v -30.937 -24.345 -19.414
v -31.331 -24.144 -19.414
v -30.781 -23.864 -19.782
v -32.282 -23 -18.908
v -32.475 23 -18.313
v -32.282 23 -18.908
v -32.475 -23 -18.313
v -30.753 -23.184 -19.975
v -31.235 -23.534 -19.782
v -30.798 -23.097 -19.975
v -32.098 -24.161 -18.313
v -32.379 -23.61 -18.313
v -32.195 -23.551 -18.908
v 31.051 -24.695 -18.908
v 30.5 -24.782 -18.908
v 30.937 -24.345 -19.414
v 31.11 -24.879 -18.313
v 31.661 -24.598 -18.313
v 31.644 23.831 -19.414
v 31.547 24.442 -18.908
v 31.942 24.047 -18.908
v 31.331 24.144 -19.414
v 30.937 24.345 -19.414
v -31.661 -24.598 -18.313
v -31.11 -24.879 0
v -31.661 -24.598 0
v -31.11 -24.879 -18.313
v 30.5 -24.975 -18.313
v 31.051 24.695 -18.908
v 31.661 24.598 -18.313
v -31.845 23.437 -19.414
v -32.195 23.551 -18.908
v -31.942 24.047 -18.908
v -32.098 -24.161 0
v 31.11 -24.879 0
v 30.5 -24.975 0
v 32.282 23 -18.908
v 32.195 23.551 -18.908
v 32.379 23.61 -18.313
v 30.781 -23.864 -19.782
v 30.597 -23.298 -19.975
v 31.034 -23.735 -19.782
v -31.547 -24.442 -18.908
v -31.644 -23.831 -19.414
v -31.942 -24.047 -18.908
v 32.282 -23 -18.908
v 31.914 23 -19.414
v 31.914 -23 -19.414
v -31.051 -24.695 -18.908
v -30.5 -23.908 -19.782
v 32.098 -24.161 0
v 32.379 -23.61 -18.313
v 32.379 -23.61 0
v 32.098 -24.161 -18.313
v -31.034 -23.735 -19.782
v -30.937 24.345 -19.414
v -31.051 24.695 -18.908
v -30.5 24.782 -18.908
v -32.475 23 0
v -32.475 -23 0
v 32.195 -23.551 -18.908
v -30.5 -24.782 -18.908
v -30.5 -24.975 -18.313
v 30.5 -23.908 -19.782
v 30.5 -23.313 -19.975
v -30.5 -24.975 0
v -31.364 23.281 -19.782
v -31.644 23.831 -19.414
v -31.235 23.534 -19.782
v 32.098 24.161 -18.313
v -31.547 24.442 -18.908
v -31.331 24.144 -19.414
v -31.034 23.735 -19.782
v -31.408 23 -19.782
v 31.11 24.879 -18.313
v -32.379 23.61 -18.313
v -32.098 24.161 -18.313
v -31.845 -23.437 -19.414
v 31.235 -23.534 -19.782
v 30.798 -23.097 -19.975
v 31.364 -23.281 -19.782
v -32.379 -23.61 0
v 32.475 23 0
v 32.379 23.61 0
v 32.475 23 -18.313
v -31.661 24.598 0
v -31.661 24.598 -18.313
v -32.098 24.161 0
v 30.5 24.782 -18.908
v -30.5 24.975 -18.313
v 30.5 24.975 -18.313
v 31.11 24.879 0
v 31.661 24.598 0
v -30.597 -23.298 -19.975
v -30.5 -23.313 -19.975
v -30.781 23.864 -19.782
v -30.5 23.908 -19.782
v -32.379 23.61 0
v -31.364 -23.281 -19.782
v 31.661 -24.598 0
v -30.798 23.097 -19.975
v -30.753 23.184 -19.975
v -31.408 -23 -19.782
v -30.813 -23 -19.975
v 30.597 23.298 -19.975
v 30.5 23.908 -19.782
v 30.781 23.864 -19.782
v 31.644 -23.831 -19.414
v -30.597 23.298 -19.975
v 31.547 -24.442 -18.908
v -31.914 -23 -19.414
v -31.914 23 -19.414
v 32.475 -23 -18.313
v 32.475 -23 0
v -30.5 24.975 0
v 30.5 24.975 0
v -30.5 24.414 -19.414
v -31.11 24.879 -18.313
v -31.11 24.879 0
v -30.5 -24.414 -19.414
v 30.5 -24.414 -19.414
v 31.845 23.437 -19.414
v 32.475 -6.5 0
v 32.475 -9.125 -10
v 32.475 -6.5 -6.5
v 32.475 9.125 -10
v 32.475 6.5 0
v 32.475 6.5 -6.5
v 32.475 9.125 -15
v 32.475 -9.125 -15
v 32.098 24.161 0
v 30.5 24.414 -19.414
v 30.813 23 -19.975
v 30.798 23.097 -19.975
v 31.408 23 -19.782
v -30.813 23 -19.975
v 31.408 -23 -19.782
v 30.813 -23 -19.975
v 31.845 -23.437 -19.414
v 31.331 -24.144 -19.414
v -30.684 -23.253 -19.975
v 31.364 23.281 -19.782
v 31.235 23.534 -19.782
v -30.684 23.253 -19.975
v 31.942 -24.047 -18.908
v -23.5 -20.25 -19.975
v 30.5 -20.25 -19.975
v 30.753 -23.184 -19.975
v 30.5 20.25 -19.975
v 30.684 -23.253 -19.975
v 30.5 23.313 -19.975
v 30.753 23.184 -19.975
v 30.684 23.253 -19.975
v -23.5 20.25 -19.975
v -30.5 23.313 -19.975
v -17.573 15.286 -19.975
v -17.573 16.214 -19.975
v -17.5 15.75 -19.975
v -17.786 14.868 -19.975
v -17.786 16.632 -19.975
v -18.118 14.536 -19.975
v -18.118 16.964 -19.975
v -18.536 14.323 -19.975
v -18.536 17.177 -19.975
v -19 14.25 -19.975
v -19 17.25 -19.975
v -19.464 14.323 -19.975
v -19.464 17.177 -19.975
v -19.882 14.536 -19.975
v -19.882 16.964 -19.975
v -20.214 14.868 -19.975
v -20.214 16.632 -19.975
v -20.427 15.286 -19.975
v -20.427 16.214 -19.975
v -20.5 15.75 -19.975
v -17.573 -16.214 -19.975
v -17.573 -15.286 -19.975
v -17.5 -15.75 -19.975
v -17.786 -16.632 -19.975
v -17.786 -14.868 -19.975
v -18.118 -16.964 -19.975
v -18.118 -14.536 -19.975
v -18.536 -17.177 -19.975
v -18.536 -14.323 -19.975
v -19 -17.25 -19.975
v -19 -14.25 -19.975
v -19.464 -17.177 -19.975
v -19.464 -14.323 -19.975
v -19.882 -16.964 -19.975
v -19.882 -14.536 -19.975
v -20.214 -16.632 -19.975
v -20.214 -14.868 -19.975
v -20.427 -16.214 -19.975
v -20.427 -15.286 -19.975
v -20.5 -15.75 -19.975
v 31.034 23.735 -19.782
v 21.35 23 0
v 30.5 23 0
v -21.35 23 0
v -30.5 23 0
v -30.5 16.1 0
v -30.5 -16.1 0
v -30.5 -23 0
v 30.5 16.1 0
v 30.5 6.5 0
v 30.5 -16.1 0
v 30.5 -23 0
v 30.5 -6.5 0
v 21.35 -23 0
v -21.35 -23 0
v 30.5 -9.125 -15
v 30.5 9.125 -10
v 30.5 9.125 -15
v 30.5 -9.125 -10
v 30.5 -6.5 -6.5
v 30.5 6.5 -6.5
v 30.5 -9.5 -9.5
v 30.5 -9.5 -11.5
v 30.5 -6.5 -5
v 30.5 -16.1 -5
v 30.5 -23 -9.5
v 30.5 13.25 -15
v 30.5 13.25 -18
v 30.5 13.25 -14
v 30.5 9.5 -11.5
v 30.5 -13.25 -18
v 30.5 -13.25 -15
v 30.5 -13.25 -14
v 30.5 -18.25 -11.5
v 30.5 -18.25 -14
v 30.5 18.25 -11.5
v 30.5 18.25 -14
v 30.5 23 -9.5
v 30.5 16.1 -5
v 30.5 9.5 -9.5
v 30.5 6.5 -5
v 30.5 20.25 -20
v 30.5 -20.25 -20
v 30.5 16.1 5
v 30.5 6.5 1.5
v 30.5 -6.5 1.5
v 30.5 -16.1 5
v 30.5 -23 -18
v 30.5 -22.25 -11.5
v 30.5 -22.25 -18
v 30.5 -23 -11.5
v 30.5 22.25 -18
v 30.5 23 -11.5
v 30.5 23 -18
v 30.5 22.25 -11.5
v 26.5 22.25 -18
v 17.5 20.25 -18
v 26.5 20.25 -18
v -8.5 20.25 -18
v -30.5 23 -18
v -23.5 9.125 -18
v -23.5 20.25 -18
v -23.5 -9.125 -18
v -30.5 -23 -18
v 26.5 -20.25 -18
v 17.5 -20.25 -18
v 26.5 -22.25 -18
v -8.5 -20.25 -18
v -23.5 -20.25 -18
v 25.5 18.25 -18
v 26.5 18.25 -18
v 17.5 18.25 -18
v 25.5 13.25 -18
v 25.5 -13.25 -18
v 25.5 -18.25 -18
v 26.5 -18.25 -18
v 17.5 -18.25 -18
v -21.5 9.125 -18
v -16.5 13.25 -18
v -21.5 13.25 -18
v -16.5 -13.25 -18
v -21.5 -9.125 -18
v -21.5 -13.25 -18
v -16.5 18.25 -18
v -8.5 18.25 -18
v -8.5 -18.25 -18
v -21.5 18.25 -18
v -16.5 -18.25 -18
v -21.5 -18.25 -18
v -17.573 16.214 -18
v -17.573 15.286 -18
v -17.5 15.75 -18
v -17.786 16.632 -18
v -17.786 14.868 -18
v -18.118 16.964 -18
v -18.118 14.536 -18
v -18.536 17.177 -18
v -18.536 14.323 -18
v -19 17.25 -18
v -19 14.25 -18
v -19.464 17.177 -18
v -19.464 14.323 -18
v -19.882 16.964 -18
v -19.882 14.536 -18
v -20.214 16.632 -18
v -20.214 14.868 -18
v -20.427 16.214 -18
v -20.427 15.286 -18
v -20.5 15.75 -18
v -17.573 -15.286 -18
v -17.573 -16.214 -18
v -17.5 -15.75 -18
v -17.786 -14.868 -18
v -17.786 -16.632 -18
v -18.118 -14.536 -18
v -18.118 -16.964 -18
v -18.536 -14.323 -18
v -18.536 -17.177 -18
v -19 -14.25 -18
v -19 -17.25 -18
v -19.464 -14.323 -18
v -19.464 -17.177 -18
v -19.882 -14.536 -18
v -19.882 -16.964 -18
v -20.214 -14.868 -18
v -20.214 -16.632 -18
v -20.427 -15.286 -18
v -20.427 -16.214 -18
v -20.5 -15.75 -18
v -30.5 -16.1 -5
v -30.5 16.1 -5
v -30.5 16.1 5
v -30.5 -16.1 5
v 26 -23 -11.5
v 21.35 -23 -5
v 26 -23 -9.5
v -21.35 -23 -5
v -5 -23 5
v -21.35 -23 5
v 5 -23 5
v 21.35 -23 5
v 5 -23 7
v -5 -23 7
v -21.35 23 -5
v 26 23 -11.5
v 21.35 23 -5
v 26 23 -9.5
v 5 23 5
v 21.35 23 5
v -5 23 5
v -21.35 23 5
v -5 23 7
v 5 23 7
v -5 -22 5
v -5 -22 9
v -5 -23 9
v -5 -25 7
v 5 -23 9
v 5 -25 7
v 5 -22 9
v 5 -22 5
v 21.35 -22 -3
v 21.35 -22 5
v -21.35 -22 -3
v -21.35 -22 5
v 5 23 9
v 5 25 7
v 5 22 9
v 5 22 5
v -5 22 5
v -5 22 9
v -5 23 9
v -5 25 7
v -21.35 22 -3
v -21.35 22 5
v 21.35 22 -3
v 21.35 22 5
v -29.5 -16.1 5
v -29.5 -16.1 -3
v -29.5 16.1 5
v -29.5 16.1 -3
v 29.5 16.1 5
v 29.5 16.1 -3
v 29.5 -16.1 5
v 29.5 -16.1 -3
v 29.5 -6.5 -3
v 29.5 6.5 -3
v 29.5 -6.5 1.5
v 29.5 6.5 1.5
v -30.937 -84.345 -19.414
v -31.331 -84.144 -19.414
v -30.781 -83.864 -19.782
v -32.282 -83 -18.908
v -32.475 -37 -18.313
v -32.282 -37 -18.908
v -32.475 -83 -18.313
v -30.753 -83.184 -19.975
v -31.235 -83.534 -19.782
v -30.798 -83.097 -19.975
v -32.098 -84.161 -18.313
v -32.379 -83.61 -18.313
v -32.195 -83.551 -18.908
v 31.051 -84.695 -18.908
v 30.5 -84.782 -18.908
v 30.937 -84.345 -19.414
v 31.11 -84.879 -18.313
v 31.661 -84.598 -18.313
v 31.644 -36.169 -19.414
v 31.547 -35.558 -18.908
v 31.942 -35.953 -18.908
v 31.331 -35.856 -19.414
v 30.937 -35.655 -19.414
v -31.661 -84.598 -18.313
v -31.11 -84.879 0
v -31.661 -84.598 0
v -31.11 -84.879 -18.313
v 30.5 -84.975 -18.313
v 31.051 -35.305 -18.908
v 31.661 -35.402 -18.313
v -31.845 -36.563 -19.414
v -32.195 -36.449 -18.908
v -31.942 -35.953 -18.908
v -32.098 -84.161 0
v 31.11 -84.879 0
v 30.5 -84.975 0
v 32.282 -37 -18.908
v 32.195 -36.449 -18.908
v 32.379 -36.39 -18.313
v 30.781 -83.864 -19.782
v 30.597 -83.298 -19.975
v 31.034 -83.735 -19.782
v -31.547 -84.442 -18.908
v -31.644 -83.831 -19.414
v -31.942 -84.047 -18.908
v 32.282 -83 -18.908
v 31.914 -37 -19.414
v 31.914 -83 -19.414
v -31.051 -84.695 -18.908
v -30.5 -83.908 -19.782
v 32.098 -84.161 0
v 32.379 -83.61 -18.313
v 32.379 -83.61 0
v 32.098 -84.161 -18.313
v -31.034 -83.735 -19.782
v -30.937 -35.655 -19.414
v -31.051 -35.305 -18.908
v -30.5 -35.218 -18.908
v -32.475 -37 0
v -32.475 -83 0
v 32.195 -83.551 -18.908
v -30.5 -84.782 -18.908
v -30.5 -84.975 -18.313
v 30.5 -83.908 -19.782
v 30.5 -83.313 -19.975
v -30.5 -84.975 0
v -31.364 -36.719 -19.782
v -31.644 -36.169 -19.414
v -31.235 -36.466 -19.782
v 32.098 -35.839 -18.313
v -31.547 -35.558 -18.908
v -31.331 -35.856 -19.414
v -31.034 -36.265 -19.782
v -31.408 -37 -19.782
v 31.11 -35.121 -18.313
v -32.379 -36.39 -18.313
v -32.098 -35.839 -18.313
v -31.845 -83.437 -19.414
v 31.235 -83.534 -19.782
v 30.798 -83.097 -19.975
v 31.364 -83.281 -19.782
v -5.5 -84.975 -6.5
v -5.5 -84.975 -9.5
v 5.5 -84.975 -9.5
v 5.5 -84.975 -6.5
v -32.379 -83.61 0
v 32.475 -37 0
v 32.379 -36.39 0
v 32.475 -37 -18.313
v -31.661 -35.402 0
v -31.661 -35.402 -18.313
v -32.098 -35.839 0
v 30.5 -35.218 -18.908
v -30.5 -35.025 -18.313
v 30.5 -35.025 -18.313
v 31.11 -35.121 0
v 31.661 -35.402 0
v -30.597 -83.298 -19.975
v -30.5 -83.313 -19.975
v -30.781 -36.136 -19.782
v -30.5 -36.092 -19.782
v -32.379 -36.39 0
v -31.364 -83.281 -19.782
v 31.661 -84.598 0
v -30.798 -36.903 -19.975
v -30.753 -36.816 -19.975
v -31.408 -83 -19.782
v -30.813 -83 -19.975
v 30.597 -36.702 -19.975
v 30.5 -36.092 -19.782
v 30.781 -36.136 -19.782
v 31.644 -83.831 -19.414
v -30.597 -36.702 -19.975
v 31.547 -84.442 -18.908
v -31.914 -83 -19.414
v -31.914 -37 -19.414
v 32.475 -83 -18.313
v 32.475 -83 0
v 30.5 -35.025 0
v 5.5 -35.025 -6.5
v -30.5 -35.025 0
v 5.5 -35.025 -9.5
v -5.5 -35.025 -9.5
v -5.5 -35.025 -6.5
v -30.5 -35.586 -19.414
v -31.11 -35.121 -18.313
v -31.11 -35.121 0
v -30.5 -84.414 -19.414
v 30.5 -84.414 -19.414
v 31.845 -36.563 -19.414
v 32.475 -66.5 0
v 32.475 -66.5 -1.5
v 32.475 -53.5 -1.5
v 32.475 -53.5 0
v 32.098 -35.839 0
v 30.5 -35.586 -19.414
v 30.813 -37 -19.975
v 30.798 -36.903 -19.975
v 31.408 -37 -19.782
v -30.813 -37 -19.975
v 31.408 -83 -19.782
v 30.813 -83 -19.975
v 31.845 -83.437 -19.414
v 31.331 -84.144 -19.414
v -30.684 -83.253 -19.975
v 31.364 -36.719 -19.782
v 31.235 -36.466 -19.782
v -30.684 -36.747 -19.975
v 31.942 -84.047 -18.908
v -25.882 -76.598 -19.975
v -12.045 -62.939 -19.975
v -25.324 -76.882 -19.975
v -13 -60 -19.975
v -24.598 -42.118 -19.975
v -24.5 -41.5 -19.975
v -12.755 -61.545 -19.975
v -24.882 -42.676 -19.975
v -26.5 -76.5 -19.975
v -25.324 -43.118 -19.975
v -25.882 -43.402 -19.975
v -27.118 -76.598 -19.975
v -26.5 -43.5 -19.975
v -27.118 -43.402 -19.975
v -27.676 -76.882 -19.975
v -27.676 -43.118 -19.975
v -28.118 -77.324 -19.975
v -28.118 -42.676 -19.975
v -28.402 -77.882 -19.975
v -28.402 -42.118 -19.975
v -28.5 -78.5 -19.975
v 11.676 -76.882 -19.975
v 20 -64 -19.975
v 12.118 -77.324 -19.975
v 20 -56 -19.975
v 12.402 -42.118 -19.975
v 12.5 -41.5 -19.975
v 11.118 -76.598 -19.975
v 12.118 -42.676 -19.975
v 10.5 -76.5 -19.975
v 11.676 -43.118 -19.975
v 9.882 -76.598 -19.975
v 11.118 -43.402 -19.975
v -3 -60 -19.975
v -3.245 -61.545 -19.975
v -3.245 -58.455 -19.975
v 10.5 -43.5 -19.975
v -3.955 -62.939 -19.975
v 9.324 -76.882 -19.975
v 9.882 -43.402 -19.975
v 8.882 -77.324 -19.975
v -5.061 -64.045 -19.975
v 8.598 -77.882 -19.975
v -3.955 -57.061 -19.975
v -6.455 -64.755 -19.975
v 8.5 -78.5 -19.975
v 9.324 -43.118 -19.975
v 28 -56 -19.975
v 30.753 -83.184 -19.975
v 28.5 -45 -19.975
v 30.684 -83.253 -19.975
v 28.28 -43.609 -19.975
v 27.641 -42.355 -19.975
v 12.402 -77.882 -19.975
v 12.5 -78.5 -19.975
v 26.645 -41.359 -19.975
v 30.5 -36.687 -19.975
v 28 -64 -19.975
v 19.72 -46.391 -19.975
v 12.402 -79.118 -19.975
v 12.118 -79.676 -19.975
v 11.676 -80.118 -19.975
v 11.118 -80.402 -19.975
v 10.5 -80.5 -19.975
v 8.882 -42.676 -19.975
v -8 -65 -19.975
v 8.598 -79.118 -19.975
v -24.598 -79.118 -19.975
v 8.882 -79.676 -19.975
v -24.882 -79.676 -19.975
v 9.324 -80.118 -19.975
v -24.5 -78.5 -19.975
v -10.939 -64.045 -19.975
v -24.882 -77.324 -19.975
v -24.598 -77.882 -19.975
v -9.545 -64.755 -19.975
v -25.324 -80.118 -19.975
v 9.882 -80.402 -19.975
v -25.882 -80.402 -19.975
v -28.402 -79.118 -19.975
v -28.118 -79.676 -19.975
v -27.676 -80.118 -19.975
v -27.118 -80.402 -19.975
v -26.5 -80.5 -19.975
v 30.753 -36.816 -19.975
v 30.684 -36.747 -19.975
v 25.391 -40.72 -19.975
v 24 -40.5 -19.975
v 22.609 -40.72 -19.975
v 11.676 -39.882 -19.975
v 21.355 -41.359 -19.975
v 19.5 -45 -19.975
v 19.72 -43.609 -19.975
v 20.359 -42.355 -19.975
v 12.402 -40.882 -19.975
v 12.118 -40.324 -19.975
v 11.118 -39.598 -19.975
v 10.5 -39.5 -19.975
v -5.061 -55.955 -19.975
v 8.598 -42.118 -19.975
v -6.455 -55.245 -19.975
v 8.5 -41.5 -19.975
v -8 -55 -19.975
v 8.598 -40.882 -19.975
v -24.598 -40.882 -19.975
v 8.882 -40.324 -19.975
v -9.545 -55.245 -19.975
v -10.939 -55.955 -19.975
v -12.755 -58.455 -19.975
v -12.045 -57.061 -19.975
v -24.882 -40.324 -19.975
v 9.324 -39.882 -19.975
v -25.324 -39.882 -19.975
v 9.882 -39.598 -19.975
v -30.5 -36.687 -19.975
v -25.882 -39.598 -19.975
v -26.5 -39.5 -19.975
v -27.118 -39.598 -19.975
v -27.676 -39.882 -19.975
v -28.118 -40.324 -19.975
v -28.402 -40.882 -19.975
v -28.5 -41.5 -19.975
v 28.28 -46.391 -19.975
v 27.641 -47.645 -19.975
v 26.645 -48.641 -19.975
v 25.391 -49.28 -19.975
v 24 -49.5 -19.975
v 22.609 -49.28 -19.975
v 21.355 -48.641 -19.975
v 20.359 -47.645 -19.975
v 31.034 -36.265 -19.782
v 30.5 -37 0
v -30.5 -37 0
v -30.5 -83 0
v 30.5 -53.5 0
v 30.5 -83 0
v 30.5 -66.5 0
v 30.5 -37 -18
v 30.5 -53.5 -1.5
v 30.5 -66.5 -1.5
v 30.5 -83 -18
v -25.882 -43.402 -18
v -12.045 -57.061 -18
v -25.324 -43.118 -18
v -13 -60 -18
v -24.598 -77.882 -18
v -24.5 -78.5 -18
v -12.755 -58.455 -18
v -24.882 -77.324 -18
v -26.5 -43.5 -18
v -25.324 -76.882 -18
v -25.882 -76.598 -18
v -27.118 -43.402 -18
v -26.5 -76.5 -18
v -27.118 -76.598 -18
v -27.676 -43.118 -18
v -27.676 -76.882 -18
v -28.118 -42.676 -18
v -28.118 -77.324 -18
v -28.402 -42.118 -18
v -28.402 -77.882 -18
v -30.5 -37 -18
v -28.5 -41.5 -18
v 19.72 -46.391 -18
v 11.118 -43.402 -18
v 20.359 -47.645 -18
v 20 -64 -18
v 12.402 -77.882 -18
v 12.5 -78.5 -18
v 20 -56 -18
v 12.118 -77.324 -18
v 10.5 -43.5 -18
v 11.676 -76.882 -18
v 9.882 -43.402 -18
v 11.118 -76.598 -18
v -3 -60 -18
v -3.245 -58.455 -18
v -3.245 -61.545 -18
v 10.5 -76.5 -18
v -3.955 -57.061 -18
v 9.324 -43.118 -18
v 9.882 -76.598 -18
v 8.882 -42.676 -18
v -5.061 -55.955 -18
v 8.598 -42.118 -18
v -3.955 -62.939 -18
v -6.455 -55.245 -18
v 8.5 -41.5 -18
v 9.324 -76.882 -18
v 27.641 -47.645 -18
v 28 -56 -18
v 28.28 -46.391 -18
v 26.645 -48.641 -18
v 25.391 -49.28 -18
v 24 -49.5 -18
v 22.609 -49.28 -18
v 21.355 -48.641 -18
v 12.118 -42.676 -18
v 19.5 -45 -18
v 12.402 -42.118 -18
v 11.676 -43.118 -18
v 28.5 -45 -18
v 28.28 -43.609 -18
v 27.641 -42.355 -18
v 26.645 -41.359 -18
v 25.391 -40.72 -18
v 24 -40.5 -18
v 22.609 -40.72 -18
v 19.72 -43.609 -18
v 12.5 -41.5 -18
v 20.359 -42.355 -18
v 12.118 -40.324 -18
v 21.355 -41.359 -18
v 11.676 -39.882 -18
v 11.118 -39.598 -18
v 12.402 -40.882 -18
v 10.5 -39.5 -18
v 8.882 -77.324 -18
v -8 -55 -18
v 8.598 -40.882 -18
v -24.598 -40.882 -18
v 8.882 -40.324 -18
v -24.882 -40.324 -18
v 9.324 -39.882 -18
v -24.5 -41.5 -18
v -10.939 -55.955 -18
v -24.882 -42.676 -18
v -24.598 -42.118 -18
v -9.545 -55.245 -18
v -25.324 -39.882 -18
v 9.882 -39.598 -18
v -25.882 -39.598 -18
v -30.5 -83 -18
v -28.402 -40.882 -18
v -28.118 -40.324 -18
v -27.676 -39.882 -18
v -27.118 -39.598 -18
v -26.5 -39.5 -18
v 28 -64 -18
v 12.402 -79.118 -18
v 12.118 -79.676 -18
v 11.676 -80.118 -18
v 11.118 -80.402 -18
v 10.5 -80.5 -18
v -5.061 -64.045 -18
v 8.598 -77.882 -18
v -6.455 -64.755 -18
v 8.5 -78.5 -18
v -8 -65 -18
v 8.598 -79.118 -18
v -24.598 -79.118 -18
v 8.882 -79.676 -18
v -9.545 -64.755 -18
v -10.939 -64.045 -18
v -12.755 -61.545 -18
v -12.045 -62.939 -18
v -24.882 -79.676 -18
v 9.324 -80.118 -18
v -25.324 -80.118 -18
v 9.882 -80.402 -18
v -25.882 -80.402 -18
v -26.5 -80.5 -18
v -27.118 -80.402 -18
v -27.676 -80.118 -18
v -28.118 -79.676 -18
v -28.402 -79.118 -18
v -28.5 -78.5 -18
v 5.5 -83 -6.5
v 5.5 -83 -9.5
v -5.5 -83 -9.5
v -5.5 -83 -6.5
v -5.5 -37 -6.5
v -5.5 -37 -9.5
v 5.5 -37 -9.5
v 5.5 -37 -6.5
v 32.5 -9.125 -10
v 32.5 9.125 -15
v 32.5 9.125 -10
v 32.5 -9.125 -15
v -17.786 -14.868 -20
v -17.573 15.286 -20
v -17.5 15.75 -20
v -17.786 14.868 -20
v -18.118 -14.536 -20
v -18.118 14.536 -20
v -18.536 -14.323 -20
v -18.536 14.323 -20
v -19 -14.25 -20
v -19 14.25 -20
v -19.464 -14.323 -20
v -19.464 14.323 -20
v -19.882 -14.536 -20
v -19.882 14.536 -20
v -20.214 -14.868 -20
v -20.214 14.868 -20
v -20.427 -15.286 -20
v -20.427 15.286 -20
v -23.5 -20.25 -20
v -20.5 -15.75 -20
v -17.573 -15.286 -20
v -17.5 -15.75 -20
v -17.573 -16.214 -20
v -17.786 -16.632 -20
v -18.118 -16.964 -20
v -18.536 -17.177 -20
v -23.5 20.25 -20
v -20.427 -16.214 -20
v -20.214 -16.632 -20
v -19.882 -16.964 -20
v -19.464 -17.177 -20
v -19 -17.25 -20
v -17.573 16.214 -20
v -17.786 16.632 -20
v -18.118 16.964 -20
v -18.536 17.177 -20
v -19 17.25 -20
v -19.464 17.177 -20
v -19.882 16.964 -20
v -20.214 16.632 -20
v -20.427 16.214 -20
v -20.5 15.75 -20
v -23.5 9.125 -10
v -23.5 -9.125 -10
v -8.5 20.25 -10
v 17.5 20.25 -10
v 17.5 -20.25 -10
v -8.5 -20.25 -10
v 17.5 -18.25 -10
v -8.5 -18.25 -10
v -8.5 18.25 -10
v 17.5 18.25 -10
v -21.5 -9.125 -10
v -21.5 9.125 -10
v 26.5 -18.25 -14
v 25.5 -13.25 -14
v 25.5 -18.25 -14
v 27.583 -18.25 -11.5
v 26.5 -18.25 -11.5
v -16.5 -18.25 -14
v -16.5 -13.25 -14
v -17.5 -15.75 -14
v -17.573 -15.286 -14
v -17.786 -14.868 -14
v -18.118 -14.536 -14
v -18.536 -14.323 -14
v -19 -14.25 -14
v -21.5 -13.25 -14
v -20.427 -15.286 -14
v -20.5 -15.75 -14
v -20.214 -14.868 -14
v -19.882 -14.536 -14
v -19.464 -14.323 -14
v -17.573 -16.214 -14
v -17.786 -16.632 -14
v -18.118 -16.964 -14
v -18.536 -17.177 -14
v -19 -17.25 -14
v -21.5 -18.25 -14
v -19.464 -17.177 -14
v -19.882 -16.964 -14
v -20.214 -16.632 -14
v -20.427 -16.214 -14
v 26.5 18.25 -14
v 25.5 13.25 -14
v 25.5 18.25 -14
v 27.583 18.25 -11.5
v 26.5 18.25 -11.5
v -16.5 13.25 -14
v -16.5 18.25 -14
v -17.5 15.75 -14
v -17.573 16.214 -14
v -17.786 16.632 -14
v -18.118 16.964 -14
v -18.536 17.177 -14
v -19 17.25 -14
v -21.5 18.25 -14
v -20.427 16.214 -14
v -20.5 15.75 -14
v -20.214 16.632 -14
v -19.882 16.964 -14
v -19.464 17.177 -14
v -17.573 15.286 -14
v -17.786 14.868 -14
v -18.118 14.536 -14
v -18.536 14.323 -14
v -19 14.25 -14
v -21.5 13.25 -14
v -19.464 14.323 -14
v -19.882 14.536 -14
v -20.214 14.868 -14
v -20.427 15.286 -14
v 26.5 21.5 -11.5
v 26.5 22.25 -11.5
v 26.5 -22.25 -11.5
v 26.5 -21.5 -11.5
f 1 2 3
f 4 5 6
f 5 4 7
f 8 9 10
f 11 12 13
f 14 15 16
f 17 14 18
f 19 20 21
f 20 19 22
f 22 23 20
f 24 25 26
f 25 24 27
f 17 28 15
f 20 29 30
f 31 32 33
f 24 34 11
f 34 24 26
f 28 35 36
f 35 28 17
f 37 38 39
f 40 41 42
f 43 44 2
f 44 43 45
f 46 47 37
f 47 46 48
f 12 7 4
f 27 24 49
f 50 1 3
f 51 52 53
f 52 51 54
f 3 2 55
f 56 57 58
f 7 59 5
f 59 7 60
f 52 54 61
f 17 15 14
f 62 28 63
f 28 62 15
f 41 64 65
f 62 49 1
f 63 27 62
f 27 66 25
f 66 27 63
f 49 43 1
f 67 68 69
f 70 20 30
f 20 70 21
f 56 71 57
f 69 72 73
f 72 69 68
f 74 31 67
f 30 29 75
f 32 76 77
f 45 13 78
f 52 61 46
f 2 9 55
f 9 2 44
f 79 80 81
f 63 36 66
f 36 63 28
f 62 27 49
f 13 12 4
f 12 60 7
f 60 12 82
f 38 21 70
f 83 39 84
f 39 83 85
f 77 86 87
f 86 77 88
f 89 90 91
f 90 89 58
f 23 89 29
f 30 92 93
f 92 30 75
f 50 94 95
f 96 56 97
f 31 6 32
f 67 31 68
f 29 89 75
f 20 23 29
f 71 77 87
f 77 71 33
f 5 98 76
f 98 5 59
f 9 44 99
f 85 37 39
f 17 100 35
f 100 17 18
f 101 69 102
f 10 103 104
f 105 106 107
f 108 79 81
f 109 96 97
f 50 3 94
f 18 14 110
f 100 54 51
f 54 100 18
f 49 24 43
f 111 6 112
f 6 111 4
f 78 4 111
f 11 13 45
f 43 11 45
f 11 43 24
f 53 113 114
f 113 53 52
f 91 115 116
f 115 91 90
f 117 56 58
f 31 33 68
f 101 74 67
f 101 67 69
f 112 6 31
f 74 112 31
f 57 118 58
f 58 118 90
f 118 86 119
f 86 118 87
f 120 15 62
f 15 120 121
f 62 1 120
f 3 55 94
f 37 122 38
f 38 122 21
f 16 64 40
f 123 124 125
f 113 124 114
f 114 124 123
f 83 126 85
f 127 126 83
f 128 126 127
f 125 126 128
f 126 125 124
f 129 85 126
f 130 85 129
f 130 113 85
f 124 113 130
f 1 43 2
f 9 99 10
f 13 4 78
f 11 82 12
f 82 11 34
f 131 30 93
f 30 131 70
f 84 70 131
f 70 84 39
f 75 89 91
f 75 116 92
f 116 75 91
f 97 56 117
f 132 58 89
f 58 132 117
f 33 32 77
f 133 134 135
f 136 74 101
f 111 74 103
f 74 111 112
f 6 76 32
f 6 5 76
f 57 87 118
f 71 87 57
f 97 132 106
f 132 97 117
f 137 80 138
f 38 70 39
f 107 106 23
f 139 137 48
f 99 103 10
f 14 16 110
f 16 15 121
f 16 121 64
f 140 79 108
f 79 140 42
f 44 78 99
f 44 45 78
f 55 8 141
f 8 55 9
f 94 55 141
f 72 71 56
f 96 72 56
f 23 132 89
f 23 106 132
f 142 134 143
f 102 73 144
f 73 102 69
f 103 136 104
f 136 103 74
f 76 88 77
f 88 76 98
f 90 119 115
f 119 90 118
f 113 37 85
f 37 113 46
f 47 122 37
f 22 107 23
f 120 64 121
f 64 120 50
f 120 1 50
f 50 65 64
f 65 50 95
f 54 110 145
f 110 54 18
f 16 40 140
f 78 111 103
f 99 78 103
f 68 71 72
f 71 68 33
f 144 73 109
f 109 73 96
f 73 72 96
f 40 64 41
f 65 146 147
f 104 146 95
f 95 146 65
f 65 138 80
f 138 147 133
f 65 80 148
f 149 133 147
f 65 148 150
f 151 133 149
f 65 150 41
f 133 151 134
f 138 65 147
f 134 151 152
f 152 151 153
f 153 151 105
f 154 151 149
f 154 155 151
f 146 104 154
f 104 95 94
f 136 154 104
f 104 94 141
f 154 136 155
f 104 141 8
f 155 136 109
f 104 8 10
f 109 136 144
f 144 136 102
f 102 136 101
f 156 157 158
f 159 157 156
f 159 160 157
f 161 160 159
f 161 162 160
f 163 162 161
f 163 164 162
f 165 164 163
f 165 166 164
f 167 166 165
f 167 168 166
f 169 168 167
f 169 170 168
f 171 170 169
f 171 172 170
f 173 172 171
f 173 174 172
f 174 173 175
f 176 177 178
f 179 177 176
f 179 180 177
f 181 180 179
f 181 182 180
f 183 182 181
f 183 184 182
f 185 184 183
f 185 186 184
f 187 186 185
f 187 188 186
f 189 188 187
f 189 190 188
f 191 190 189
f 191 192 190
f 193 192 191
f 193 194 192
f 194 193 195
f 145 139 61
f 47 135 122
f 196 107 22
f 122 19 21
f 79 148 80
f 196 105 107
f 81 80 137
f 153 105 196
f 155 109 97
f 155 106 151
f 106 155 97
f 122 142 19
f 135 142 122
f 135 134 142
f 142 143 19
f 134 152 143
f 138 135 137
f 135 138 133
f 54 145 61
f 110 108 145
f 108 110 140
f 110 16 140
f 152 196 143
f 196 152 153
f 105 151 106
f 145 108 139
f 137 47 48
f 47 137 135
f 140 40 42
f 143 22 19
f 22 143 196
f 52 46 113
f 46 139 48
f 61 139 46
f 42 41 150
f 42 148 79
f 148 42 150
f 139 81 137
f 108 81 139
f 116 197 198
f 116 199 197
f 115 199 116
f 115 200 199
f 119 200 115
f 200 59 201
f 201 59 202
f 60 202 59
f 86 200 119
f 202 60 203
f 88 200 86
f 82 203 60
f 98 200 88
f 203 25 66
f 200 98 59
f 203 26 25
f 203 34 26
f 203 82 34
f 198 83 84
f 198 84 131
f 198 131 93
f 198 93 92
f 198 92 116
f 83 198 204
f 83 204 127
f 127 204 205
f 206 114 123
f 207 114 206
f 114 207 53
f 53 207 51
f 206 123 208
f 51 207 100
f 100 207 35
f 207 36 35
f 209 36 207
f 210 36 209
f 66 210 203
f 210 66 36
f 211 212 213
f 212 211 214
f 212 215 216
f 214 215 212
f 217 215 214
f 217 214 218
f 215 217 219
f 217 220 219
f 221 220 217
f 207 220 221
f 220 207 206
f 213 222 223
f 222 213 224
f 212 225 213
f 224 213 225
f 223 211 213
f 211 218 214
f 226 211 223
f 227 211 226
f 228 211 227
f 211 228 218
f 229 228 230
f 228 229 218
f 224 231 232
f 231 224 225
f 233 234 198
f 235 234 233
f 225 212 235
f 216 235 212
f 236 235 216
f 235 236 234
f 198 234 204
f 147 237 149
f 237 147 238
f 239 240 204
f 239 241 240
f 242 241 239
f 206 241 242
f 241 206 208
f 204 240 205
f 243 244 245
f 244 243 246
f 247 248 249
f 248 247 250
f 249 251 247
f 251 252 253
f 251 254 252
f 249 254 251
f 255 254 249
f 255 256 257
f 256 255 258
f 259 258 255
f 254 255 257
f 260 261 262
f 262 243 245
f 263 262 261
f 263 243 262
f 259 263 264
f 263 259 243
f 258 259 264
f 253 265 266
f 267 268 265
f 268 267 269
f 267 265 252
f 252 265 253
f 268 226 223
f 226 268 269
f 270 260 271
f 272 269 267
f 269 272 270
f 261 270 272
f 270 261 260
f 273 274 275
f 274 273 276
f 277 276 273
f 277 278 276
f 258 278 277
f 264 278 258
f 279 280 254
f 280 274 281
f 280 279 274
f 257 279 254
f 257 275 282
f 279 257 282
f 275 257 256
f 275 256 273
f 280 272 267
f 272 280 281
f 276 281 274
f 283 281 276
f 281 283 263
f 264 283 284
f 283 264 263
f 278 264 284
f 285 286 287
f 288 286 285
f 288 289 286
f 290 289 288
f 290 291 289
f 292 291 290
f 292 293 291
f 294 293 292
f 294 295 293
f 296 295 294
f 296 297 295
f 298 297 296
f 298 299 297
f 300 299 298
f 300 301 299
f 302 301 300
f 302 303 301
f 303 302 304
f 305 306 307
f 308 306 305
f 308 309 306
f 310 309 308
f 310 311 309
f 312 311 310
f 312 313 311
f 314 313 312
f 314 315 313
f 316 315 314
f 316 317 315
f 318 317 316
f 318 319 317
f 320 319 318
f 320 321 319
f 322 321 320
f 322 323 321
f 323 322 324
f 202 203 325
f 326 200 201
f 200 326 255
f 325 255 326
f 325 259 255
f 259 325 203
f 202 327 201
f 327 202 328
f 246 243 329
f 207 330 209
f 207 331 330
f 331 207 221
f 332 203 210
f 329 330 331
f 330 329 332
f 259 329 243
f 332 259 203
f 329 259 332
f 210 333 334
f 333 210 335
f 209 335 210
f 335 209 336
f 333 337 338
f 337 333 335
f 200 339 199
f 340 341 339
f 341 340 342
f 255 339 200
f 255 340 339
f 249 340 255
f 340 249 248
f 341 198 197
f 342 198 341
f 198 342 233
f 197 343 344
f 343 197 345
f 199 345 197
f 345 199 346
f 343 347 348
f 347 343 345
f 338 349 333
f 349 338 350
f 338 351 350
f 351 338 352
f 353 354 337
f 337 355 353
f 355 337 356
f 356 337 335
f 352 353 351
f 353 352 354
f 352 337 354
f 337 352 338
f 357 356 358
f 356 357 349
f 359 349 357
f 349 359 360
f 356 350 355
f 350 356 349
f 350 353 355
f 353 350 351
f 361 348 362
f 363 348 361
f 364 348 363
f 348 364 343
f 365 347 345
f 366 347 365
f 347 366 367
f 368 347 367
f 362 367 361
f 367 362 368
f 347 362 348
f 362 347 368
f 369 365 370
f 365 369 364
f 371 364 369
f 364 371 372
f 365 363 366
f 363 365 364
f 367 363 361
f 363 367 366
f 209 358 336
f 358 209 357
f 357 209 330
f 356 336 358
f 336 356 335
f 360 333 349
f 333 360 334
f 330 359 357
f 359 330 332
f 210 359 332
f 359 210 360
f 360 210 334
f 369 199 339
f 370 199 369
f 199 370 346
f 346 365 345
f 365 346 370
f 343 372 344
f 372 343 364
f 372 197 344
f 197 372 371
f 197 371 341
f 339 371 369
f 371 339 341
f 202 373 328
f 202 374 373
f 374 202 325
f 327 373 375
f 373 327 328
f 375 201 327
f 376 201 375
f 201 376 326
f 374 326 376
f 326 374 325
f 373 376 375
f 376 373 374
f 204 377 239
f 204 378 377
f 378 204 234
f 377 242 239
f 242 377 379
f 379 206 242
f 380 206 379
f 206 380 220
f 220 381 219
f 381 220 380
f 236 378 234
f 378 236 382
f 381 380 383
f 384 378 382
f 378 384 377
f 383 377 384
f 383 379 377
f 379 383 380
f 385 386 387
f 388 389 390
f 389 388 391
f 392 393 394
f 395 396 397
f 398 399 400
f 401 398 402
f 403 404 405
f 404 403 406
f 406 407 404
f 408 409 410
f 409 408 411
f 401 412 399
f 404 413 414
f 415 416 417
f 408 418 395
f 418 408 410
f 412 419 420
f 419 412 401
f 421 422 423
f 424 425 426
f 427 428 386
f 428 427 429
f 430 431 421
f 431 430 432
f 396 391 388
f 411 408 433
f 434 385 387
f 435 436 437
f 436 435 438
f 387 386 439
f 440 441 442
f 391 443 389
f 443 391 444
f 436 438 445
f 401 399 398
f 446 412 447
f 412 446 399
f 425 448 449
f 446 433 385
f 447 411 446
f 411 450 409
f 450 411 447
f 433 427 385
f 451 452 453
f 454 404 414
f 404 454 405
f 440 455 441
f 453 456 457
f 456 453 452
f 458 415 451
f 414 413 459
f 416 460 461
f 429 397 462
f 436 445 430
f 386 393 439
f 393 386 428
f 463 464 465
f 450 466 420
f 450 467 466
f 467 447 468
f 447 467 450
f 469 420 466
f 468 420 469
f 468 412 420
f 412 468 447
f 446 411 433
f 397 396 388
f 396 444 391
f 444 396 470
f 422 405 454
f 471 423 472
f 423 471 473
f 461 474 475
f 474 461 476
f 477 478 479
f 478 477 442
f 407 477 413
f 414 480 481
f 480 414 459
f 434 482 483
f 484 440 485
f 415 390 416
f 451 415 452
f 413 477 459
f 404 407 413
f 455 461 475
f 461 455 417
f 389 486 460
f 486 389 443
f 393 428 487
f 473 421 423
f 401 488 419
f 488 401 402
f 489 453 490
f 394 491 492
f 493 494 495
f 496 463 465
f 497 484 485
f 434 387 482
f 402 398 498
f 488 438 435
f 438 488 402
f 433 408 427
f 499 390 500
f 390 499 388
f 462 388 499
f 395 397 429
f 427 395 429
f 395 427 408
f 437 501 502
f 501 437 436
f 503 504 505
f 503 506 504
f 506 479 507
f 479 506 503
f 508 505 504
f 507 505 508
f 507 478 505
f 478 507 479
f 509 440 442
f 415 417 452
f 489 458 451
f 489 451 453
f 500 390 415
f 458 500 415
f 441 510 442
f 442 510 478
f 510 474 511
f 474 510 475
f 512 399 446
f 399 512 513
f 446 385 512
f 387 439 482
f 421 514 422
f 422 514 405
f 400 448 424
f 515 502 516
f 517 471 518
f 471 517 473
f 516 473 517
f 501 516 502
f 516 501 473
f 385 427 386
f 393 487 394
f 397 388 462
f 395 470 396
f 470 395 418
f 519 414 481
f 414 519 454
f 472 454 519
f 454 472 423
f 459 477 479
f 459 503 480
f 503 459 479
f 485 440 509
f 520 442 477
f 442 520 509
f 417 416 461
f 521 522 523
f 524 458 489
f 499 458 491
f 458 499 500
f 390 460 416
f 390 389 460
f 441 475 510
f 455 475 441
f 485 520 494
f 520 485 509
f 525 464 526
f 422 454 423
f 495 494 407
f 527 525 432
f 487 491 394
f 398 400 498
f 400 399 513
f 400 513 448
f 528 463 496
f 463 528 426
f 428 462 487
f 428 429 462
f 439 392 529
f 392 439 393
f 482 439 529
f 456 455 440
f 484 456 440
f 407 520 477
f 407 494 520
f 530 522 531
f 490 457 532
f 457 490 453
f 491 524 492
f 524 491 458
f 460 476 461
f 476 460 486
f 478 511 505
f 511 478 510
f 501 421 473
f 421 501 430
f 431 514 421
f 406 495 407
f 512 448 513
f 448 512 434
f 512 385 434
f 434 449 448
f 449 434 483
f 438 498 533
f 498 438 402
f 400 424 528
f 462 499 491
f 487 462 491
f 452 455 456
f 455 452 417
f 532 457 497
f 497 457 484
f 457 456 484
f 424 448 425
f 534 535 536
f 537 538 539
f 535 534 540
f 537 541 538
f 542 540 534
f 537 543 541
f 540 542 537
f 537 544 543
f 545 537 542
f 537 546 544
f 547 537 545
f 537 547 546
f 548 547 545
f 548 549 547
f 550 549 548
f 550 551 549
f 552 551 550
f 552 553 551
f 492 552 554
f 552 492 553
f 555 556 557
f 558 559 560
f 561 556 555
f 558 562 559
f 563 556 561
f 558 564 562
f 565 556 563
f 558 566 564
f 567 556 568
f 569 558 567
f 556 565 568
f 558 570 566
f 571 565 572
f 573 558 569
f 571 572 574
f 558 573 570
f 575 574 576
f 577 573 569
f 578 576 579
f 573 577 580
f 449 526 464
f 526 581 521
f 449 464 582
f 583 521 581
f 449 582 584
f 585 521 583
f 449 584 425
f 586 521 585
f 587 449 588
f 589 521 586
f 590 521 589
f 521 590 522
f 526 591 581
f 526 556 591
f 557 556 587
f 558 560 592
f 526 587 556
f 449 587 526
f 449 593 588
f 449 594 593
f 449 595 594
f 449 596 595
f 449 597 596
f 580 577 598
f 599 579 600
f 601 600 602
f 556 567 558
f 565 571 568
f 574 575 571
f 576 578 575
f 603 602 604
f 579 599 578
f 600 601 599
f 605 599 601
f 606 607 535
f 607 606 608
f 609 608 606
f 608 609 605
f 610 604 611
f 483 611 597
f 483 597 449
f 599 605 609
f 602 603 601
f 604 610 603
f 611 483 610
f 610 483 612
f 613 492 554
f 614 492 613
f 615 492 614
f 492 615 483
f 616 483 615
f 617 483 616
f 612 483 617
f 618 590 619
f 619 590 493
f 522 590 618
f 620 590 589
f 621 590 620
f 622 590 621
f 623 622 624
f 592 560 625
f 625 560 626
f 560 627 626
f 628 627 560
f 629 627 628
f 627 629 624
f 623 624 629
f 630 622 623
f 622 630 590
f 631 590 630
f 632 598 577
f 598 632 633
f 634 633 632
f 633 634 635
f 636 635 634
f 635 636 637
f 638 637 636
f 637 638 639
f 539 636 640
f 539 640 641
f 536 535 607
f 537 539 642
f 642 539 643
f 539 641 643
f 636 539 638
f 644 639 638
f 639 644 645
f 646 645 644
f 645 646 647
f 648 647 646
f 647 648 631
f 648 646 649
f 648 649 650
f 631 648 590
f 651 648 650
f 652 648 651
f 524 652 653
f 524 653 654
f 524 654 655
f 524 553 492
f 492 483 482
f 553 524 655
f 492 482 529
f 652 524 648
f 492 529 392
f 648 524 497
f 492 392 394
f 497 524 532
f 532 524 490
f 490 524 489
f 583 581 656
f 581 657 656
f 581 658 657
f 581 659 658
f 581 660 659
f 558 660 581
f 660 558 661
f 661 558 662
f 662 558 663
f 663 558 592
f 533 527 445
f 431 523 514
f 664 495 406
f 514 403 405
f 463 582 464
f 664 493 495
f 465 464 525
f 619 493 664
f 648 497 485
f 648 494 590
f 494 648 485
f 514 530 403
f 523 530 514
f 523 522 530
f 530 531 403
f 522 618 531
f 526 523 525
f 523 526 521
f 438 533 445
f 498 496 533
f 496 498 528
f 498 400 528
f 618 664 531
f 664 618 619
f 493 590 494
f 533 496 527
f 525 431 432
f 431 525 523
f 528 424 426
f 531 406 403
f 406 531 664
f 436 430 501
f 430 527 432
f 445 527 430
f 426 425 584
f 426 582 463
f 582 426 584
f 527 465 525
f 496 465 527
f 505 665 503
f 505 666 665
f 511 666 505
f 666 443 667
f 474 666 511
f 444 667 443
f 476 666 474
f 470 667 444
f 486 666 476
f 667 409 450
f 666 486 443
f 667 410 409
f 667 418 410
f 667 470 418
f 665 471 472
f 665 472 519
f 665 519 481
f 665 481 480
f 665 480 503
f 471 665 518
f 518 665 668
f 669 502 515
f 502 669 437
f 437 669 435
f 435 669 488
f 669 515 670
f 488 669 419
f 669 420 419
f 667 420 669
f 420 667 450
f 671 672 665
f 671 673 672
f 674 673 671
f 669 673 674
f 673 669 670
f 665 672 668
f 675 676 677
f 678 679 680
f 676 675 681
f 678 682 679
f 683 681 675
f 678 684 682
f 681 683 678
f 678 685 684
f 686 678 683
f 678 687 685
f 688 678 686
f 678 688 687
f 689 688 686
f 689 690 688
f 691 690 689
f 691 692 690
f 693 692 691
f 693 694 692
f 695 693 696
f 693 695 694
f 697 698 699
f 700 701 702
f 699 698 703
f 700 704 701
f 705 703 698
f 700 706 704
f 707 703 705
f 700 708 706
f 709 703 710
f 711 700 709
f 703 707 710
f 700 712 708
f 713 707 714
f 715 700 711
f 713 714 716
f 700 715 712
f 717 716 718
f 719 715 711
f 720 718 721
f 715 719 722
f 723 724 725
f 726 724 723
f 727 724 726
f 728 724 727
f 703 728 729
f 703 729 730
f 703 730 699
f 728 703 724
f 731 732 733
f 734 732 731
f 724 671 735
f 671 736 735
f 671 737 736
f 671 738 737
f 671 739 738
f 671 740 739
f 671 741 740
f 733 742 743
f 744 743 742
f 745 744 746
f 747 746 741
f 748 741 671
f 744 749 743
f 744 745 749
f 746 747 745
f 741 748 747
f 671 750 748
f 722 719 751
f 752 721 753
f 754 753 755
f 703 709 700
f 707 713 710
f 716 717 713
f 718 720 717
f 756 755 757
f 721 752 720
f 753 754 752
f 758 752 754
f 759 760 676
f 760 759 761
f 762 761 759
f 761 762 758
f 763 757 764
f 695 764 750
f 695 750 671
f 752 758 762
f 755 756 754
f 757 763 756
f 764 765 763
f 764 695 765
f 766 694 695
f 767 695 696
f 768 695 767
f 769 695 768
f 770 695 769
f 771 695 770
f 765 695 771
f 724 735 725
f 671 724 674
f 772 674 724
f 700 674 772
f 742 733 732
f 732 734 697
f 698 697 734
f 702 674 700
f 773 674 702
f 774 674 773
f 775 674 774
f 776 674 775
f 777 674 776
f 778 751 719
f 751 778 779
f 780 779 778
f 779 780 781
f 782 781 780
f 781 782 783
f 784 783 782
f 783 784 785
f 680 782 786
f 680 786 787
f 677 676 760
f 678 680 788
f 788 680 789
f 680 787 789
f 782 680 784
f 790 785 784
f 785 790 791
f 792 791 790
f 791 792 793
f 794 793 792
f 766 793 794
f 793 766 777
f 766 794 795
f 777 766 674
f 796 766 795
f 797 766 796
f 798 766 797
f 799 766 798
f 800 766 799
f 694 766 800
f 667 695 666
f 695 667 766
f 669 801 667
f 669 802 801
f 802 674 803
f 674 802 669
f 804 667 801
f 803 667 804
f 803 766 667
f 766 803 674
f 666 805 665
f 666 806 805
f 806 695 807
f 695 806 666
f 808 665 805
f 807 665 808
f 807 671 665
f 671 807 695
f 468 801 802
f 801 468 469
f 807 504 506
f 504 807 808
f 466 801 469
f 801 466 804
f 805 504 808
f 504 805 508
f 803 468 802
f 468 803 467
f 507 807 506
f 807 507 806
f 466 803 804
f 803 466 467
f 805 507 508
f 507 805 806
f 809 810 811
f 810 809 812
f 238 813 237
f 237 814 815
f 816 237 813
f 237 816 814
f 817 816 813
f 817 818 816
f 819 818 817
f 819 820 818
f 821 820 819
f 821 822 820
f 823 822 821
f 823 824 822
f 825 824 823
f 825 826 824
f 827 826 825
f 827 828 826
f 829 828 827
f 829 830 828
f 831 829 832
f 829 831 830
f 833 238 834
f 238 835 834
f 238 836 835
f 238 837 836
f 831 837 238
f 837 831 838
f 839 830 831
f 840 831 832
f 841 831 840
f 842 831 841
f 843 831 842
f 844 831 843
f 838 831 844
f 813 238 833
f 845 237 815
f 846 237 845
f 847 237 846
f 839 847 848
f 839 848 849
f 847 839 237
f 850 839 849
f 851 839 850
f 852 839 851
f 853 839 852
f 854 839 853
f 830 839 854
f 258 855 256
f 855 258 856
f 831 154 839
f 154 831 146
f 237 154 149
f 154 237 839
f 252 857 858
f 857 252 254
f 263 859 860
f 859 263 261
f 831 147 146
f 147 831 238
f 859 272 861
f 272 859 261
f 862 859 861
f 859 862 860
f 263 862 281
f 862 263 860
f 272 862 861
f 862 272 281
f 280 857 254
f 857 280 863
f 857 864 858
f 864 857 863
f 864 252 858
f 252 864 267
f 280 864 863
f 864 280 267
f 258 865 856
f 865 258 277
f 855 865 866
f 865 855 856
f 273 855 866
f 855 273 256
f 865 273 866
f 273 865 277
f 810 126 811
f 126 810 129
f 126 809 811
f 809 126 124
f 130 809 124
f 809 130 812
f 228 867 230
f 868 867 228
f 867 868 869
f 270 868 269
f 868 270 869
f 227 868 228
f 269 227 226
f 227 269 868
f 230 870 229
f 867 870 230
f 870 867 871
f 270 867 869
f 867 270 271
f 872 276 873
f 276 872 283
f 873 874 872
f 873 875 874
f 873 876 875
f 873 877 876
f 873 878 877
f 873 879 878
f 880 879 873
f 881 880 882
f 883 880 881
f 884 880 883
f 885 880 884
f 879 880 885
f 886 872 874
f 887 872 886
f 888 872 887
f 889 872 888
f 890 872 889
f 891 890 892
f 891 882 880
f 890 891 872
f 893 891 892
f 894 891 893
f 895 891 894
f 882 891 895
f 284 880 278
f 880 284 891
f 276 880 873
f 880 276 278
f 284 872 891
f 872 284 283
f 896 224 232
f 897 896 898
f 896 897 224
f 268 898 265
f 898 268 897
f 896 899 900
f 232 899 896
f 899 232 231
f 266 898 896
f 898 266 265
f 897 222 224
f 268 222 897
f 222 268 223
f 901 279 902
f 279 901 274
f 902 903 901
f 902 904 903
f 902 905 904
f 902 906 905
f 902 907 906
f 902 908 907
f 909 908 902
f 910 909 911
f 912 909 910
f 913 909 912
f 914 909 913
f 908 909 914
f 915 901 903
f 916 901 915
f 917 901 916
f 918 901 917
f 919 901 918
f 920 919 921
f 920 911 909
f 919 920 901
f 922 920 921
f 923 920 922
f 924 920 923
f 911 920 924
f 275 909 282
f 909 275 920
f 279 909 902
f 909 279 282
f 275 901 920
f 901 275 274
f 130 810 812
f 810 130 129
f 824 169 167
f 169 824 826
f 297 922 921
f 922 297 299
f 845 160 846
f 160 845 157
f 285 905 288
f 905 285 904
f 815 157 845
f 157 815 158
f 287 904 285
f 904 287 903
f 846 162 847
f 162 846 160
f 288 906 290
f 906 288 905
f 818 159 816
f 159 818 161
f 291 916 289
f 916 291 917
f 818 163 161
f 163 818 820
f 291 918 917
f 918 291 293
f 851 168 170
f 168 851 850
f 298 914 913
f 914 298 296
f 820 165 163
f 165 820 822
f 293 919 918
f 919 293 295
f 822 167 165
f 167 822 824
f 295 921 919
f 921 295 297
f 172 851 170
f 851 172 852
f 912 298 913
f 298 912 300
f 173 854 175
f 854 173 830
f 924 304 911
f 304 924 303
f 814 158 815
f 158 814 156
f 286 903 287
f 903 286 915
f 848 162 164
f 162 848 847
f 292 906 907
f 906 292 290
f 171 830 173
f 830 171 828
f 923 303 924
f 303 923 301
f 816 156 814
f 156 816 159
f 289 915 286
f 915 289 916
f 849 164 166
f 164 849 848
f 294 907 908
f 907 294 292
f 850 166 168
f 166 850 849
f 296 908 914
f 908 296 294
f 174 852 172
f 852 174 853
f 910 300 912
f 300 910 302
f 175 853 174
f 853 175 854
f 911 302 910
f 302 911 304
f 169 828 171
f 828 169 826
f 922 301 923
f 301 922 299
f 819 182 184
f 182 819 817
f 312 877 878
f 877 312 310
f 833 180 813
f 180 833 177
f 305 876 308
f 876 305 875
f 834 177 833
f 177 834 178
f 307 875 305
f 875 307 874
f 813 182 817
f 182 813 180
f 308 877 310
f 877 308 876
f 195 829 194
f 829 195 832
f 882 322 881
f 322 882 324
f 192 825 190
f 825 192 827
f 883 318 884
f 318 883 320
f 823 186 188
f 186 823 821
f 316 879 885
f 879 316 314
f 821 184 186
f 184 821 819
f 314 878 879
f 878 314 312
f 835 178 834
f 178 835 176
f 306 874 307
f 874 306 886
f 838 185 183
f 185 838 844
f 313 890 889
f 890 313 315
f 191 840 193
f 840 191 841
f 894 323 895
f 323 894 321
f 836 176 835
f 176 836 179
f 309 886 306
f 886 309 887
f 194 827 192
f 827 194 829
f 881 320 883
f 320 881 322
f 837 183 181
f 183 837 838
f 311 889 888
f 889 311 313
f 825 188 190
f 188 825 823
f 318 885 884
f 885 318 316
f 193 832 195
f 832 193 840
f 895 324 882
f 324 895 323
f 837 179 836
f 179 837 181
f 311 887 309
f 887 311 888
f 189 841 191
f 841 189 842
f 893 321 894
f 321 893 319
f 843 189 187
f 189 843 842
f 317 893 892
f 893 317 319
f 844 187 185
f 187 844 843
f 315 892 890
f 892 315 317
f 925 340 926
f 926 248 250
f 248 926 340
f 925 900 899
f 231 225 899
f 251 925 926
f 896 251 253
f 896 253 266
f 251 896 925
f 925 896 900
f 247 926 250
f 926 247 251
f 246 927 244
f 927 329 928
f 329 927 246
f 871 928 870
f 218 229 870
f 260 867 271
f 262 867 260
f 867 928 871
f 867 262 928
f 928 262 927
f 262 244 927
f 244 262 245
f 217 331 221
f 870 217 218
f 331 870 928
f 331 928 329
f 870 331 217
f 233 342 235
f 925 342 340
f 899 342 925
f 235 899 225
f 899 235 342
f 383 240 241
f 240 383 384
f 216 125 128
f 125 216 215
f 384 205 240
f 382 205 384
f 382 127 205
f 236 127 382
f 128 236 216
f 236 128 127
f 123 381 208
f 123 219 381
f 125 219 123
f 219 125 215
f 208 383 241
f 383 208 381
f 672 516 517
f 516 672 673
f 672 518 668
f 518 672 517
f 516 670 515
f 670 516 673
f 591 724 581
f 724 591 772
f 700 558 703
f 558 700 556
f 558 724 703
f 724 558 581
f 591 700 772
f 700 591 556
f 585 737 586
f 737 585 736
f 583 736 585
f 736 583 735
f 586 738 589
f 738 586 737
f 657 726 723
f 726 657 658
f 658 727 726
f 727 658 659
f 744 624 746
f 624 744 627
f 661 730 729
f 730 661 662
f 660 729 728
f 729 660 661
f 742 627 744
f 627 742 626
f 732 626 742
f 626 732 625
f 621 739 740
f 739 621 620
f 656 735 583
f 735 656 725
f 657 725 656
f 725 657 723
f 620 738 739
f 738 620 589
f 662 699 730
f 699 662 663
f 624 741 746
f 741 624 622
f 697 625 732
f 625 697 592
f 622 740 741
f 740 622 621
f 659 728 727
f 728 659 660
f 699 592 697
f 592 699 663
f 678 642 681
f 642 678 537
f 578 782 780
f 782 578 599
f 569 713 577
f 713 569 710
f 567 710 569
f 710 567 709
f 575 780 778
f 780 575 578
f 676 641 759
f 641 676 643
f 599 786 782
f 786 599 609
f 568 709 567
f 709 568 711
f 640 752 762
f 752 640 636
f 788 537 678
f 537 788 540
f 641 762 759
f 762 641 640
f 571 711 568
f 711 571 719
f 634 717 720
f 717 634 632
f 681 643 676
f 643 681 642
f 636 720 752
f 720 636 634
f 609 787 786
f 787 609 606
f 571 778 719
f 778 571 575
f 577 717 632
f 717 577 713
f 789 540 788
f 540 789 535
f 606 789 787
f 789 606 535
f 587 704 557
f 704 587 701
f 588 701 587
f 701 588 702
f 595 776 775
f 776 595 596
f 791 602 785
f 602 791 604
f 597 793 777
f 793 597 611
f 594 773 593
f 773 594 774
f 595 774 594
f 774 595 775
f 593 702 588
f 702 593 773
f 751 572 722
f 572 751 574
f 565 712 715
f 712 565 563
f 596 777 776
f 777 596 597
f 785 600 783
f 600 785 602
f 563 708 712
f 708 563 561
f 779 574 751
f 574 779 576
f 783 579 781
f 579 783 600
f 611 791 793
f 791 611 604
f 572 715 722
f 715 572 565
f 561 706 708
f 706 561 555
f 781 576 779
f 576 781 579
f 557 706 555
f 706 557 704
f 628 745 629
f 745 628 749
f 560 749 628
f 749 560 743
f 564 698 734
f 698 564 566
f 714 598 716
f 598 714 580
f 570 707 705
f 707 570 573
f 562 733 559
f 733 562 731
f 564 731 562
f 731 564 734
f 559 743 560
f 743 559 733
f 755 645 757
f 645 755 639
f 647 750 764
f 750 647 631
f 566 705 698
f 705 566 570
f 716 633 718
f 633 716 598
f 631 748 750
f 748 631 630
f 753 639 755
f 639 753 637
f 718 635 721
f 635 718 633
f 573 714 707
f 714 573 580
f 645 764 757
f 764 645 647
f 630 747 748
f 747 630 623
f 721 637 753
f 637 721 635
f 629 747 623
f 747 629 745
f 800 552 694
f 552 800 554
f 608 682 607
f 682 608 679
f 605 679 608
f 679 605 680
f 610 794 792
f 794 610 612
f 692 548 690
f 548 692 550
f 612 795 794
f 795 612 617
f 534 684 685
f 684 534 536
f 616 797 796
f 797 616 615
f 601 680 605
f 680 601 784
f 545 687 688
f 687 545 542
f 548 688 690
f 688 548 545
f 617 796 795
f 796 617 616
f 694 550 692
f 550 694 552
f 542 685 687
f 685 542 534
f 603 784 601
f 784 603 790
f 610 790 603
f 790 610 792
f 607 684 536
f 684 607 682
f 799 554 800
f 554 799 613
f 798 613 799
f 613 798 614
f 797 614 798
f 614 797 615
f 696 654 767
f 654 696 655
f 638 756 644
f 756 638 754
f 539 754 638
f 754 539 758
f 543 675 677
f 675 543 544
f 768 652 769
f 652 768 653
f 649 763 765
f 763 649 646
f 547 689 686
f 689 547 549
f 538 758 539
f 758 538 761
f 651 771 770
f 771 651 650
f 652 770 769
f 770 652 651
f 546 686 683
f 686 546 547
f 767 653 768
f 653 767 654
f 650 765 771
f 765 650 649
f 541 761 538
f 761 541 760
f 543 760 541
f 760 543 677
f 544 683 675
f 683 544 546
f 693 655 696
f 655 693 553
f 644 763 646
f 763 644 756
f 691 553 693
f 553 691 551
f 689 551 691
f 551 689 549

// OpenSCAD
module rounded_cube(length, width, height, radius){
    hull(){
        for (x = [-(length/2)+radius, length/2-radius]){
            for (y = [-width/2+radius, width/2-radius]){
                for (z = [-height/2+radius, height/2-radius]){
                    $fn=20;
                    translate([x,y,z]) sphere(r=radius);
                }
            }
        }
    }
}

module top_rounded_box(length, width, height, radius, thickness){
    difference() {
        rounded_cube(length, width, height*2, radius);
        translate([0,0,-height/2]) cube([length+10,width+10,height], center=true);
        translate([0,0,(height-thickness)/2]) cube([length-2*thickness, width-2*thickness, height-thickness], center=true);
    }
}



module pcb_clamp(length, width, thickness, overhang, distance, corner, pcb_thickness){
    //bottom
    translate([0,0,-thickness/2]) cube([length+thickness*2,width+thickness*2,thickness], center=true);    
    //clamps
    translate([length/4,-width/2-thickness,0]) rotate(90,[0,0,1]) clamp(length/2, distance+pcb_thickness+overhang+1,thickness, overhang);
    translate([-length/4,width/2+thickness,0]) rotate(-90,[0,0,1]) clamp(length/2, distance+pcb_thickness+overhang+1,thickness, overhang);
    translate([-length/2-thickness,-width/4,0]) clamp(width/2, distance+pcb_thickness+overhang+1,thickness, overhang);
    translate([length/2+thickness,width/4,0]) rotate(180,[0,0,1]) clamp(width/2, distance+pcb_thickness+overhang+1,thickness, overhang);
    //distance holders
    translate([length/2-corner,-width/2,0]) cube([corner,corner,distance]);
    translate([-length/2,-width/2,0]) cube([corner,corner,distance]);
    translate([length/2-corner,width/2-corner,0]) cube([corner,corner,distance]);
    translate([-length/2,width/2-corner,0]) cube([corner,corner,distance]);
}

module clamp(length, height, thickness, overhang){
    rotate(-90,[0,0,1]) rotate(-90,[0,1,0]) linear_extrude(length) polygon([[0,0],[0,thickness],[height-overhang,thickness],[height-overhang,thickness+overhang],[height,thickness],[height,0]]);
}

module box_bottom(length, width, height, radius, thickness){
    rotate(180,[1,0,0]) top_rounded_box(length, width, height, radius, thickness);
    //clamps
    translate([-5,-width/2+thickness+1,-1]) rotate(-90,[0,0,1]) clamp(10,10,1,thickness);
    translate([5,width/2-thickness-1,-1]) rotate(90,[0,0,1]) clamp(10,10,1,thickness);
    //lips
    translate([(length-2*thickness)/2*0.7,-(width/2-thickness),-5]) rotate(-90,[0,1,0]) linear_extrude((length-2*thickness)*0.7) polygon([[0,0],[2,1],[10,1],[10,0]]);
    translate([-(length-2*thickness)/2*0.7,(width/2-thickness),-5]) rotate(180,[0,0,1]) rotate(-90,[0,1,0]) linear_extrude((length-2*thickness)*0.7) polygon([[0,0],[2,1],[10,1],[10,0]]);
    translate([-(length-2*thickness)/2,-(width/2-thickness)*0.7,-5]) rotate(270,[0,0,1]) rotate(-90,[0,1,0]) linear_extrude((width-2*thickness)*0.7) polygon([[0,0],[2,1],[10,1],[10,0]]);
    translate([(length-2*thickness)/2,(width/2-thickness)*0.7,-5]) rotate(-270,[0,0,1]) rotate(-90,[0,1,0]) linear_extrude((width-2*thickness)*0.7) polygon([[0,0],[2,1],[10,1],[10,0]]);
}
module box_top(length, width, height, radius, thickness){
    difference(){
        rotate(180,[1,0,0]) top_rounded_box(length, width, height, radius, thickness);
        //cut out for catching the bottom clamps
        translate([0,0,thickness/2-9]) cube([11,width+10,thickness+1], center=true);
    }
}

module box(length, width, height, radius, thickness){
    box_bottom(length, width, height/2, radius, thickness);
    translate([0,-width-10,0]) box_top(length, width, height/2, radius, thickness);
}




difference(){
    union(){
        box(65,50,40,2,2);
        difference(){
            //clamp
            translate([4.5,0,-18]) pcb_clamp(52,36.5,2,0,4,5,3);
            //remove front part of clamp
            translate([31.5,0,-20]) cube([2,44,10], center=true);
            //Löcher für PCB Halteschrauben
            $fn=20;
            translate([-19,15.75,-23]) cylinder(r=1.5, h=30);
            translate([-19,-15.75,-23]) cylinder(r=1.5, h=30);
        }
        translate([29,20.25,-15]) cube([5,4,7], center=true);
        translate([29,-20.25,-15]) cube([5,4,7], center=true);
        translate([26,-23,-11.5]) linear_extrude(2) polygon([[0,0],[5,0],[5,15]]);
        translate([26,23,-9.5]) rotate(180,[1,0,0]) linear_extrude(2) polygon([[0,0],[5,0],[5,15]]);
    }
    //USB port
    translate([30,0,-2.5]) cube([20,13,8], center=true);
    translate([25,-60,2.5]) cube([20,13,8], center=true);
    //cable access top
    translate([24,-60,-15.5]) cube([8,8,20], center=true);
    //button
    $fn=20;
    translate([24,-45,-23]) cylinder(r=4.5, h=30);
    //center hole top
    translate([-8,-60,-23]) cylinder(r=5, h=30);
    //mounting hole top
    translate([10.5,-78.5,-23]) cylinder(r=2, h=30);
    translate([10.5,-41.5,-23]) cylinder(r=2, h=30);
    translate([-26.5,-78.5,-23]) cylinder(r=2, h=30);
    translate([-26.5,-41.5,-23]) cylinder(r=2, h=30);
}
